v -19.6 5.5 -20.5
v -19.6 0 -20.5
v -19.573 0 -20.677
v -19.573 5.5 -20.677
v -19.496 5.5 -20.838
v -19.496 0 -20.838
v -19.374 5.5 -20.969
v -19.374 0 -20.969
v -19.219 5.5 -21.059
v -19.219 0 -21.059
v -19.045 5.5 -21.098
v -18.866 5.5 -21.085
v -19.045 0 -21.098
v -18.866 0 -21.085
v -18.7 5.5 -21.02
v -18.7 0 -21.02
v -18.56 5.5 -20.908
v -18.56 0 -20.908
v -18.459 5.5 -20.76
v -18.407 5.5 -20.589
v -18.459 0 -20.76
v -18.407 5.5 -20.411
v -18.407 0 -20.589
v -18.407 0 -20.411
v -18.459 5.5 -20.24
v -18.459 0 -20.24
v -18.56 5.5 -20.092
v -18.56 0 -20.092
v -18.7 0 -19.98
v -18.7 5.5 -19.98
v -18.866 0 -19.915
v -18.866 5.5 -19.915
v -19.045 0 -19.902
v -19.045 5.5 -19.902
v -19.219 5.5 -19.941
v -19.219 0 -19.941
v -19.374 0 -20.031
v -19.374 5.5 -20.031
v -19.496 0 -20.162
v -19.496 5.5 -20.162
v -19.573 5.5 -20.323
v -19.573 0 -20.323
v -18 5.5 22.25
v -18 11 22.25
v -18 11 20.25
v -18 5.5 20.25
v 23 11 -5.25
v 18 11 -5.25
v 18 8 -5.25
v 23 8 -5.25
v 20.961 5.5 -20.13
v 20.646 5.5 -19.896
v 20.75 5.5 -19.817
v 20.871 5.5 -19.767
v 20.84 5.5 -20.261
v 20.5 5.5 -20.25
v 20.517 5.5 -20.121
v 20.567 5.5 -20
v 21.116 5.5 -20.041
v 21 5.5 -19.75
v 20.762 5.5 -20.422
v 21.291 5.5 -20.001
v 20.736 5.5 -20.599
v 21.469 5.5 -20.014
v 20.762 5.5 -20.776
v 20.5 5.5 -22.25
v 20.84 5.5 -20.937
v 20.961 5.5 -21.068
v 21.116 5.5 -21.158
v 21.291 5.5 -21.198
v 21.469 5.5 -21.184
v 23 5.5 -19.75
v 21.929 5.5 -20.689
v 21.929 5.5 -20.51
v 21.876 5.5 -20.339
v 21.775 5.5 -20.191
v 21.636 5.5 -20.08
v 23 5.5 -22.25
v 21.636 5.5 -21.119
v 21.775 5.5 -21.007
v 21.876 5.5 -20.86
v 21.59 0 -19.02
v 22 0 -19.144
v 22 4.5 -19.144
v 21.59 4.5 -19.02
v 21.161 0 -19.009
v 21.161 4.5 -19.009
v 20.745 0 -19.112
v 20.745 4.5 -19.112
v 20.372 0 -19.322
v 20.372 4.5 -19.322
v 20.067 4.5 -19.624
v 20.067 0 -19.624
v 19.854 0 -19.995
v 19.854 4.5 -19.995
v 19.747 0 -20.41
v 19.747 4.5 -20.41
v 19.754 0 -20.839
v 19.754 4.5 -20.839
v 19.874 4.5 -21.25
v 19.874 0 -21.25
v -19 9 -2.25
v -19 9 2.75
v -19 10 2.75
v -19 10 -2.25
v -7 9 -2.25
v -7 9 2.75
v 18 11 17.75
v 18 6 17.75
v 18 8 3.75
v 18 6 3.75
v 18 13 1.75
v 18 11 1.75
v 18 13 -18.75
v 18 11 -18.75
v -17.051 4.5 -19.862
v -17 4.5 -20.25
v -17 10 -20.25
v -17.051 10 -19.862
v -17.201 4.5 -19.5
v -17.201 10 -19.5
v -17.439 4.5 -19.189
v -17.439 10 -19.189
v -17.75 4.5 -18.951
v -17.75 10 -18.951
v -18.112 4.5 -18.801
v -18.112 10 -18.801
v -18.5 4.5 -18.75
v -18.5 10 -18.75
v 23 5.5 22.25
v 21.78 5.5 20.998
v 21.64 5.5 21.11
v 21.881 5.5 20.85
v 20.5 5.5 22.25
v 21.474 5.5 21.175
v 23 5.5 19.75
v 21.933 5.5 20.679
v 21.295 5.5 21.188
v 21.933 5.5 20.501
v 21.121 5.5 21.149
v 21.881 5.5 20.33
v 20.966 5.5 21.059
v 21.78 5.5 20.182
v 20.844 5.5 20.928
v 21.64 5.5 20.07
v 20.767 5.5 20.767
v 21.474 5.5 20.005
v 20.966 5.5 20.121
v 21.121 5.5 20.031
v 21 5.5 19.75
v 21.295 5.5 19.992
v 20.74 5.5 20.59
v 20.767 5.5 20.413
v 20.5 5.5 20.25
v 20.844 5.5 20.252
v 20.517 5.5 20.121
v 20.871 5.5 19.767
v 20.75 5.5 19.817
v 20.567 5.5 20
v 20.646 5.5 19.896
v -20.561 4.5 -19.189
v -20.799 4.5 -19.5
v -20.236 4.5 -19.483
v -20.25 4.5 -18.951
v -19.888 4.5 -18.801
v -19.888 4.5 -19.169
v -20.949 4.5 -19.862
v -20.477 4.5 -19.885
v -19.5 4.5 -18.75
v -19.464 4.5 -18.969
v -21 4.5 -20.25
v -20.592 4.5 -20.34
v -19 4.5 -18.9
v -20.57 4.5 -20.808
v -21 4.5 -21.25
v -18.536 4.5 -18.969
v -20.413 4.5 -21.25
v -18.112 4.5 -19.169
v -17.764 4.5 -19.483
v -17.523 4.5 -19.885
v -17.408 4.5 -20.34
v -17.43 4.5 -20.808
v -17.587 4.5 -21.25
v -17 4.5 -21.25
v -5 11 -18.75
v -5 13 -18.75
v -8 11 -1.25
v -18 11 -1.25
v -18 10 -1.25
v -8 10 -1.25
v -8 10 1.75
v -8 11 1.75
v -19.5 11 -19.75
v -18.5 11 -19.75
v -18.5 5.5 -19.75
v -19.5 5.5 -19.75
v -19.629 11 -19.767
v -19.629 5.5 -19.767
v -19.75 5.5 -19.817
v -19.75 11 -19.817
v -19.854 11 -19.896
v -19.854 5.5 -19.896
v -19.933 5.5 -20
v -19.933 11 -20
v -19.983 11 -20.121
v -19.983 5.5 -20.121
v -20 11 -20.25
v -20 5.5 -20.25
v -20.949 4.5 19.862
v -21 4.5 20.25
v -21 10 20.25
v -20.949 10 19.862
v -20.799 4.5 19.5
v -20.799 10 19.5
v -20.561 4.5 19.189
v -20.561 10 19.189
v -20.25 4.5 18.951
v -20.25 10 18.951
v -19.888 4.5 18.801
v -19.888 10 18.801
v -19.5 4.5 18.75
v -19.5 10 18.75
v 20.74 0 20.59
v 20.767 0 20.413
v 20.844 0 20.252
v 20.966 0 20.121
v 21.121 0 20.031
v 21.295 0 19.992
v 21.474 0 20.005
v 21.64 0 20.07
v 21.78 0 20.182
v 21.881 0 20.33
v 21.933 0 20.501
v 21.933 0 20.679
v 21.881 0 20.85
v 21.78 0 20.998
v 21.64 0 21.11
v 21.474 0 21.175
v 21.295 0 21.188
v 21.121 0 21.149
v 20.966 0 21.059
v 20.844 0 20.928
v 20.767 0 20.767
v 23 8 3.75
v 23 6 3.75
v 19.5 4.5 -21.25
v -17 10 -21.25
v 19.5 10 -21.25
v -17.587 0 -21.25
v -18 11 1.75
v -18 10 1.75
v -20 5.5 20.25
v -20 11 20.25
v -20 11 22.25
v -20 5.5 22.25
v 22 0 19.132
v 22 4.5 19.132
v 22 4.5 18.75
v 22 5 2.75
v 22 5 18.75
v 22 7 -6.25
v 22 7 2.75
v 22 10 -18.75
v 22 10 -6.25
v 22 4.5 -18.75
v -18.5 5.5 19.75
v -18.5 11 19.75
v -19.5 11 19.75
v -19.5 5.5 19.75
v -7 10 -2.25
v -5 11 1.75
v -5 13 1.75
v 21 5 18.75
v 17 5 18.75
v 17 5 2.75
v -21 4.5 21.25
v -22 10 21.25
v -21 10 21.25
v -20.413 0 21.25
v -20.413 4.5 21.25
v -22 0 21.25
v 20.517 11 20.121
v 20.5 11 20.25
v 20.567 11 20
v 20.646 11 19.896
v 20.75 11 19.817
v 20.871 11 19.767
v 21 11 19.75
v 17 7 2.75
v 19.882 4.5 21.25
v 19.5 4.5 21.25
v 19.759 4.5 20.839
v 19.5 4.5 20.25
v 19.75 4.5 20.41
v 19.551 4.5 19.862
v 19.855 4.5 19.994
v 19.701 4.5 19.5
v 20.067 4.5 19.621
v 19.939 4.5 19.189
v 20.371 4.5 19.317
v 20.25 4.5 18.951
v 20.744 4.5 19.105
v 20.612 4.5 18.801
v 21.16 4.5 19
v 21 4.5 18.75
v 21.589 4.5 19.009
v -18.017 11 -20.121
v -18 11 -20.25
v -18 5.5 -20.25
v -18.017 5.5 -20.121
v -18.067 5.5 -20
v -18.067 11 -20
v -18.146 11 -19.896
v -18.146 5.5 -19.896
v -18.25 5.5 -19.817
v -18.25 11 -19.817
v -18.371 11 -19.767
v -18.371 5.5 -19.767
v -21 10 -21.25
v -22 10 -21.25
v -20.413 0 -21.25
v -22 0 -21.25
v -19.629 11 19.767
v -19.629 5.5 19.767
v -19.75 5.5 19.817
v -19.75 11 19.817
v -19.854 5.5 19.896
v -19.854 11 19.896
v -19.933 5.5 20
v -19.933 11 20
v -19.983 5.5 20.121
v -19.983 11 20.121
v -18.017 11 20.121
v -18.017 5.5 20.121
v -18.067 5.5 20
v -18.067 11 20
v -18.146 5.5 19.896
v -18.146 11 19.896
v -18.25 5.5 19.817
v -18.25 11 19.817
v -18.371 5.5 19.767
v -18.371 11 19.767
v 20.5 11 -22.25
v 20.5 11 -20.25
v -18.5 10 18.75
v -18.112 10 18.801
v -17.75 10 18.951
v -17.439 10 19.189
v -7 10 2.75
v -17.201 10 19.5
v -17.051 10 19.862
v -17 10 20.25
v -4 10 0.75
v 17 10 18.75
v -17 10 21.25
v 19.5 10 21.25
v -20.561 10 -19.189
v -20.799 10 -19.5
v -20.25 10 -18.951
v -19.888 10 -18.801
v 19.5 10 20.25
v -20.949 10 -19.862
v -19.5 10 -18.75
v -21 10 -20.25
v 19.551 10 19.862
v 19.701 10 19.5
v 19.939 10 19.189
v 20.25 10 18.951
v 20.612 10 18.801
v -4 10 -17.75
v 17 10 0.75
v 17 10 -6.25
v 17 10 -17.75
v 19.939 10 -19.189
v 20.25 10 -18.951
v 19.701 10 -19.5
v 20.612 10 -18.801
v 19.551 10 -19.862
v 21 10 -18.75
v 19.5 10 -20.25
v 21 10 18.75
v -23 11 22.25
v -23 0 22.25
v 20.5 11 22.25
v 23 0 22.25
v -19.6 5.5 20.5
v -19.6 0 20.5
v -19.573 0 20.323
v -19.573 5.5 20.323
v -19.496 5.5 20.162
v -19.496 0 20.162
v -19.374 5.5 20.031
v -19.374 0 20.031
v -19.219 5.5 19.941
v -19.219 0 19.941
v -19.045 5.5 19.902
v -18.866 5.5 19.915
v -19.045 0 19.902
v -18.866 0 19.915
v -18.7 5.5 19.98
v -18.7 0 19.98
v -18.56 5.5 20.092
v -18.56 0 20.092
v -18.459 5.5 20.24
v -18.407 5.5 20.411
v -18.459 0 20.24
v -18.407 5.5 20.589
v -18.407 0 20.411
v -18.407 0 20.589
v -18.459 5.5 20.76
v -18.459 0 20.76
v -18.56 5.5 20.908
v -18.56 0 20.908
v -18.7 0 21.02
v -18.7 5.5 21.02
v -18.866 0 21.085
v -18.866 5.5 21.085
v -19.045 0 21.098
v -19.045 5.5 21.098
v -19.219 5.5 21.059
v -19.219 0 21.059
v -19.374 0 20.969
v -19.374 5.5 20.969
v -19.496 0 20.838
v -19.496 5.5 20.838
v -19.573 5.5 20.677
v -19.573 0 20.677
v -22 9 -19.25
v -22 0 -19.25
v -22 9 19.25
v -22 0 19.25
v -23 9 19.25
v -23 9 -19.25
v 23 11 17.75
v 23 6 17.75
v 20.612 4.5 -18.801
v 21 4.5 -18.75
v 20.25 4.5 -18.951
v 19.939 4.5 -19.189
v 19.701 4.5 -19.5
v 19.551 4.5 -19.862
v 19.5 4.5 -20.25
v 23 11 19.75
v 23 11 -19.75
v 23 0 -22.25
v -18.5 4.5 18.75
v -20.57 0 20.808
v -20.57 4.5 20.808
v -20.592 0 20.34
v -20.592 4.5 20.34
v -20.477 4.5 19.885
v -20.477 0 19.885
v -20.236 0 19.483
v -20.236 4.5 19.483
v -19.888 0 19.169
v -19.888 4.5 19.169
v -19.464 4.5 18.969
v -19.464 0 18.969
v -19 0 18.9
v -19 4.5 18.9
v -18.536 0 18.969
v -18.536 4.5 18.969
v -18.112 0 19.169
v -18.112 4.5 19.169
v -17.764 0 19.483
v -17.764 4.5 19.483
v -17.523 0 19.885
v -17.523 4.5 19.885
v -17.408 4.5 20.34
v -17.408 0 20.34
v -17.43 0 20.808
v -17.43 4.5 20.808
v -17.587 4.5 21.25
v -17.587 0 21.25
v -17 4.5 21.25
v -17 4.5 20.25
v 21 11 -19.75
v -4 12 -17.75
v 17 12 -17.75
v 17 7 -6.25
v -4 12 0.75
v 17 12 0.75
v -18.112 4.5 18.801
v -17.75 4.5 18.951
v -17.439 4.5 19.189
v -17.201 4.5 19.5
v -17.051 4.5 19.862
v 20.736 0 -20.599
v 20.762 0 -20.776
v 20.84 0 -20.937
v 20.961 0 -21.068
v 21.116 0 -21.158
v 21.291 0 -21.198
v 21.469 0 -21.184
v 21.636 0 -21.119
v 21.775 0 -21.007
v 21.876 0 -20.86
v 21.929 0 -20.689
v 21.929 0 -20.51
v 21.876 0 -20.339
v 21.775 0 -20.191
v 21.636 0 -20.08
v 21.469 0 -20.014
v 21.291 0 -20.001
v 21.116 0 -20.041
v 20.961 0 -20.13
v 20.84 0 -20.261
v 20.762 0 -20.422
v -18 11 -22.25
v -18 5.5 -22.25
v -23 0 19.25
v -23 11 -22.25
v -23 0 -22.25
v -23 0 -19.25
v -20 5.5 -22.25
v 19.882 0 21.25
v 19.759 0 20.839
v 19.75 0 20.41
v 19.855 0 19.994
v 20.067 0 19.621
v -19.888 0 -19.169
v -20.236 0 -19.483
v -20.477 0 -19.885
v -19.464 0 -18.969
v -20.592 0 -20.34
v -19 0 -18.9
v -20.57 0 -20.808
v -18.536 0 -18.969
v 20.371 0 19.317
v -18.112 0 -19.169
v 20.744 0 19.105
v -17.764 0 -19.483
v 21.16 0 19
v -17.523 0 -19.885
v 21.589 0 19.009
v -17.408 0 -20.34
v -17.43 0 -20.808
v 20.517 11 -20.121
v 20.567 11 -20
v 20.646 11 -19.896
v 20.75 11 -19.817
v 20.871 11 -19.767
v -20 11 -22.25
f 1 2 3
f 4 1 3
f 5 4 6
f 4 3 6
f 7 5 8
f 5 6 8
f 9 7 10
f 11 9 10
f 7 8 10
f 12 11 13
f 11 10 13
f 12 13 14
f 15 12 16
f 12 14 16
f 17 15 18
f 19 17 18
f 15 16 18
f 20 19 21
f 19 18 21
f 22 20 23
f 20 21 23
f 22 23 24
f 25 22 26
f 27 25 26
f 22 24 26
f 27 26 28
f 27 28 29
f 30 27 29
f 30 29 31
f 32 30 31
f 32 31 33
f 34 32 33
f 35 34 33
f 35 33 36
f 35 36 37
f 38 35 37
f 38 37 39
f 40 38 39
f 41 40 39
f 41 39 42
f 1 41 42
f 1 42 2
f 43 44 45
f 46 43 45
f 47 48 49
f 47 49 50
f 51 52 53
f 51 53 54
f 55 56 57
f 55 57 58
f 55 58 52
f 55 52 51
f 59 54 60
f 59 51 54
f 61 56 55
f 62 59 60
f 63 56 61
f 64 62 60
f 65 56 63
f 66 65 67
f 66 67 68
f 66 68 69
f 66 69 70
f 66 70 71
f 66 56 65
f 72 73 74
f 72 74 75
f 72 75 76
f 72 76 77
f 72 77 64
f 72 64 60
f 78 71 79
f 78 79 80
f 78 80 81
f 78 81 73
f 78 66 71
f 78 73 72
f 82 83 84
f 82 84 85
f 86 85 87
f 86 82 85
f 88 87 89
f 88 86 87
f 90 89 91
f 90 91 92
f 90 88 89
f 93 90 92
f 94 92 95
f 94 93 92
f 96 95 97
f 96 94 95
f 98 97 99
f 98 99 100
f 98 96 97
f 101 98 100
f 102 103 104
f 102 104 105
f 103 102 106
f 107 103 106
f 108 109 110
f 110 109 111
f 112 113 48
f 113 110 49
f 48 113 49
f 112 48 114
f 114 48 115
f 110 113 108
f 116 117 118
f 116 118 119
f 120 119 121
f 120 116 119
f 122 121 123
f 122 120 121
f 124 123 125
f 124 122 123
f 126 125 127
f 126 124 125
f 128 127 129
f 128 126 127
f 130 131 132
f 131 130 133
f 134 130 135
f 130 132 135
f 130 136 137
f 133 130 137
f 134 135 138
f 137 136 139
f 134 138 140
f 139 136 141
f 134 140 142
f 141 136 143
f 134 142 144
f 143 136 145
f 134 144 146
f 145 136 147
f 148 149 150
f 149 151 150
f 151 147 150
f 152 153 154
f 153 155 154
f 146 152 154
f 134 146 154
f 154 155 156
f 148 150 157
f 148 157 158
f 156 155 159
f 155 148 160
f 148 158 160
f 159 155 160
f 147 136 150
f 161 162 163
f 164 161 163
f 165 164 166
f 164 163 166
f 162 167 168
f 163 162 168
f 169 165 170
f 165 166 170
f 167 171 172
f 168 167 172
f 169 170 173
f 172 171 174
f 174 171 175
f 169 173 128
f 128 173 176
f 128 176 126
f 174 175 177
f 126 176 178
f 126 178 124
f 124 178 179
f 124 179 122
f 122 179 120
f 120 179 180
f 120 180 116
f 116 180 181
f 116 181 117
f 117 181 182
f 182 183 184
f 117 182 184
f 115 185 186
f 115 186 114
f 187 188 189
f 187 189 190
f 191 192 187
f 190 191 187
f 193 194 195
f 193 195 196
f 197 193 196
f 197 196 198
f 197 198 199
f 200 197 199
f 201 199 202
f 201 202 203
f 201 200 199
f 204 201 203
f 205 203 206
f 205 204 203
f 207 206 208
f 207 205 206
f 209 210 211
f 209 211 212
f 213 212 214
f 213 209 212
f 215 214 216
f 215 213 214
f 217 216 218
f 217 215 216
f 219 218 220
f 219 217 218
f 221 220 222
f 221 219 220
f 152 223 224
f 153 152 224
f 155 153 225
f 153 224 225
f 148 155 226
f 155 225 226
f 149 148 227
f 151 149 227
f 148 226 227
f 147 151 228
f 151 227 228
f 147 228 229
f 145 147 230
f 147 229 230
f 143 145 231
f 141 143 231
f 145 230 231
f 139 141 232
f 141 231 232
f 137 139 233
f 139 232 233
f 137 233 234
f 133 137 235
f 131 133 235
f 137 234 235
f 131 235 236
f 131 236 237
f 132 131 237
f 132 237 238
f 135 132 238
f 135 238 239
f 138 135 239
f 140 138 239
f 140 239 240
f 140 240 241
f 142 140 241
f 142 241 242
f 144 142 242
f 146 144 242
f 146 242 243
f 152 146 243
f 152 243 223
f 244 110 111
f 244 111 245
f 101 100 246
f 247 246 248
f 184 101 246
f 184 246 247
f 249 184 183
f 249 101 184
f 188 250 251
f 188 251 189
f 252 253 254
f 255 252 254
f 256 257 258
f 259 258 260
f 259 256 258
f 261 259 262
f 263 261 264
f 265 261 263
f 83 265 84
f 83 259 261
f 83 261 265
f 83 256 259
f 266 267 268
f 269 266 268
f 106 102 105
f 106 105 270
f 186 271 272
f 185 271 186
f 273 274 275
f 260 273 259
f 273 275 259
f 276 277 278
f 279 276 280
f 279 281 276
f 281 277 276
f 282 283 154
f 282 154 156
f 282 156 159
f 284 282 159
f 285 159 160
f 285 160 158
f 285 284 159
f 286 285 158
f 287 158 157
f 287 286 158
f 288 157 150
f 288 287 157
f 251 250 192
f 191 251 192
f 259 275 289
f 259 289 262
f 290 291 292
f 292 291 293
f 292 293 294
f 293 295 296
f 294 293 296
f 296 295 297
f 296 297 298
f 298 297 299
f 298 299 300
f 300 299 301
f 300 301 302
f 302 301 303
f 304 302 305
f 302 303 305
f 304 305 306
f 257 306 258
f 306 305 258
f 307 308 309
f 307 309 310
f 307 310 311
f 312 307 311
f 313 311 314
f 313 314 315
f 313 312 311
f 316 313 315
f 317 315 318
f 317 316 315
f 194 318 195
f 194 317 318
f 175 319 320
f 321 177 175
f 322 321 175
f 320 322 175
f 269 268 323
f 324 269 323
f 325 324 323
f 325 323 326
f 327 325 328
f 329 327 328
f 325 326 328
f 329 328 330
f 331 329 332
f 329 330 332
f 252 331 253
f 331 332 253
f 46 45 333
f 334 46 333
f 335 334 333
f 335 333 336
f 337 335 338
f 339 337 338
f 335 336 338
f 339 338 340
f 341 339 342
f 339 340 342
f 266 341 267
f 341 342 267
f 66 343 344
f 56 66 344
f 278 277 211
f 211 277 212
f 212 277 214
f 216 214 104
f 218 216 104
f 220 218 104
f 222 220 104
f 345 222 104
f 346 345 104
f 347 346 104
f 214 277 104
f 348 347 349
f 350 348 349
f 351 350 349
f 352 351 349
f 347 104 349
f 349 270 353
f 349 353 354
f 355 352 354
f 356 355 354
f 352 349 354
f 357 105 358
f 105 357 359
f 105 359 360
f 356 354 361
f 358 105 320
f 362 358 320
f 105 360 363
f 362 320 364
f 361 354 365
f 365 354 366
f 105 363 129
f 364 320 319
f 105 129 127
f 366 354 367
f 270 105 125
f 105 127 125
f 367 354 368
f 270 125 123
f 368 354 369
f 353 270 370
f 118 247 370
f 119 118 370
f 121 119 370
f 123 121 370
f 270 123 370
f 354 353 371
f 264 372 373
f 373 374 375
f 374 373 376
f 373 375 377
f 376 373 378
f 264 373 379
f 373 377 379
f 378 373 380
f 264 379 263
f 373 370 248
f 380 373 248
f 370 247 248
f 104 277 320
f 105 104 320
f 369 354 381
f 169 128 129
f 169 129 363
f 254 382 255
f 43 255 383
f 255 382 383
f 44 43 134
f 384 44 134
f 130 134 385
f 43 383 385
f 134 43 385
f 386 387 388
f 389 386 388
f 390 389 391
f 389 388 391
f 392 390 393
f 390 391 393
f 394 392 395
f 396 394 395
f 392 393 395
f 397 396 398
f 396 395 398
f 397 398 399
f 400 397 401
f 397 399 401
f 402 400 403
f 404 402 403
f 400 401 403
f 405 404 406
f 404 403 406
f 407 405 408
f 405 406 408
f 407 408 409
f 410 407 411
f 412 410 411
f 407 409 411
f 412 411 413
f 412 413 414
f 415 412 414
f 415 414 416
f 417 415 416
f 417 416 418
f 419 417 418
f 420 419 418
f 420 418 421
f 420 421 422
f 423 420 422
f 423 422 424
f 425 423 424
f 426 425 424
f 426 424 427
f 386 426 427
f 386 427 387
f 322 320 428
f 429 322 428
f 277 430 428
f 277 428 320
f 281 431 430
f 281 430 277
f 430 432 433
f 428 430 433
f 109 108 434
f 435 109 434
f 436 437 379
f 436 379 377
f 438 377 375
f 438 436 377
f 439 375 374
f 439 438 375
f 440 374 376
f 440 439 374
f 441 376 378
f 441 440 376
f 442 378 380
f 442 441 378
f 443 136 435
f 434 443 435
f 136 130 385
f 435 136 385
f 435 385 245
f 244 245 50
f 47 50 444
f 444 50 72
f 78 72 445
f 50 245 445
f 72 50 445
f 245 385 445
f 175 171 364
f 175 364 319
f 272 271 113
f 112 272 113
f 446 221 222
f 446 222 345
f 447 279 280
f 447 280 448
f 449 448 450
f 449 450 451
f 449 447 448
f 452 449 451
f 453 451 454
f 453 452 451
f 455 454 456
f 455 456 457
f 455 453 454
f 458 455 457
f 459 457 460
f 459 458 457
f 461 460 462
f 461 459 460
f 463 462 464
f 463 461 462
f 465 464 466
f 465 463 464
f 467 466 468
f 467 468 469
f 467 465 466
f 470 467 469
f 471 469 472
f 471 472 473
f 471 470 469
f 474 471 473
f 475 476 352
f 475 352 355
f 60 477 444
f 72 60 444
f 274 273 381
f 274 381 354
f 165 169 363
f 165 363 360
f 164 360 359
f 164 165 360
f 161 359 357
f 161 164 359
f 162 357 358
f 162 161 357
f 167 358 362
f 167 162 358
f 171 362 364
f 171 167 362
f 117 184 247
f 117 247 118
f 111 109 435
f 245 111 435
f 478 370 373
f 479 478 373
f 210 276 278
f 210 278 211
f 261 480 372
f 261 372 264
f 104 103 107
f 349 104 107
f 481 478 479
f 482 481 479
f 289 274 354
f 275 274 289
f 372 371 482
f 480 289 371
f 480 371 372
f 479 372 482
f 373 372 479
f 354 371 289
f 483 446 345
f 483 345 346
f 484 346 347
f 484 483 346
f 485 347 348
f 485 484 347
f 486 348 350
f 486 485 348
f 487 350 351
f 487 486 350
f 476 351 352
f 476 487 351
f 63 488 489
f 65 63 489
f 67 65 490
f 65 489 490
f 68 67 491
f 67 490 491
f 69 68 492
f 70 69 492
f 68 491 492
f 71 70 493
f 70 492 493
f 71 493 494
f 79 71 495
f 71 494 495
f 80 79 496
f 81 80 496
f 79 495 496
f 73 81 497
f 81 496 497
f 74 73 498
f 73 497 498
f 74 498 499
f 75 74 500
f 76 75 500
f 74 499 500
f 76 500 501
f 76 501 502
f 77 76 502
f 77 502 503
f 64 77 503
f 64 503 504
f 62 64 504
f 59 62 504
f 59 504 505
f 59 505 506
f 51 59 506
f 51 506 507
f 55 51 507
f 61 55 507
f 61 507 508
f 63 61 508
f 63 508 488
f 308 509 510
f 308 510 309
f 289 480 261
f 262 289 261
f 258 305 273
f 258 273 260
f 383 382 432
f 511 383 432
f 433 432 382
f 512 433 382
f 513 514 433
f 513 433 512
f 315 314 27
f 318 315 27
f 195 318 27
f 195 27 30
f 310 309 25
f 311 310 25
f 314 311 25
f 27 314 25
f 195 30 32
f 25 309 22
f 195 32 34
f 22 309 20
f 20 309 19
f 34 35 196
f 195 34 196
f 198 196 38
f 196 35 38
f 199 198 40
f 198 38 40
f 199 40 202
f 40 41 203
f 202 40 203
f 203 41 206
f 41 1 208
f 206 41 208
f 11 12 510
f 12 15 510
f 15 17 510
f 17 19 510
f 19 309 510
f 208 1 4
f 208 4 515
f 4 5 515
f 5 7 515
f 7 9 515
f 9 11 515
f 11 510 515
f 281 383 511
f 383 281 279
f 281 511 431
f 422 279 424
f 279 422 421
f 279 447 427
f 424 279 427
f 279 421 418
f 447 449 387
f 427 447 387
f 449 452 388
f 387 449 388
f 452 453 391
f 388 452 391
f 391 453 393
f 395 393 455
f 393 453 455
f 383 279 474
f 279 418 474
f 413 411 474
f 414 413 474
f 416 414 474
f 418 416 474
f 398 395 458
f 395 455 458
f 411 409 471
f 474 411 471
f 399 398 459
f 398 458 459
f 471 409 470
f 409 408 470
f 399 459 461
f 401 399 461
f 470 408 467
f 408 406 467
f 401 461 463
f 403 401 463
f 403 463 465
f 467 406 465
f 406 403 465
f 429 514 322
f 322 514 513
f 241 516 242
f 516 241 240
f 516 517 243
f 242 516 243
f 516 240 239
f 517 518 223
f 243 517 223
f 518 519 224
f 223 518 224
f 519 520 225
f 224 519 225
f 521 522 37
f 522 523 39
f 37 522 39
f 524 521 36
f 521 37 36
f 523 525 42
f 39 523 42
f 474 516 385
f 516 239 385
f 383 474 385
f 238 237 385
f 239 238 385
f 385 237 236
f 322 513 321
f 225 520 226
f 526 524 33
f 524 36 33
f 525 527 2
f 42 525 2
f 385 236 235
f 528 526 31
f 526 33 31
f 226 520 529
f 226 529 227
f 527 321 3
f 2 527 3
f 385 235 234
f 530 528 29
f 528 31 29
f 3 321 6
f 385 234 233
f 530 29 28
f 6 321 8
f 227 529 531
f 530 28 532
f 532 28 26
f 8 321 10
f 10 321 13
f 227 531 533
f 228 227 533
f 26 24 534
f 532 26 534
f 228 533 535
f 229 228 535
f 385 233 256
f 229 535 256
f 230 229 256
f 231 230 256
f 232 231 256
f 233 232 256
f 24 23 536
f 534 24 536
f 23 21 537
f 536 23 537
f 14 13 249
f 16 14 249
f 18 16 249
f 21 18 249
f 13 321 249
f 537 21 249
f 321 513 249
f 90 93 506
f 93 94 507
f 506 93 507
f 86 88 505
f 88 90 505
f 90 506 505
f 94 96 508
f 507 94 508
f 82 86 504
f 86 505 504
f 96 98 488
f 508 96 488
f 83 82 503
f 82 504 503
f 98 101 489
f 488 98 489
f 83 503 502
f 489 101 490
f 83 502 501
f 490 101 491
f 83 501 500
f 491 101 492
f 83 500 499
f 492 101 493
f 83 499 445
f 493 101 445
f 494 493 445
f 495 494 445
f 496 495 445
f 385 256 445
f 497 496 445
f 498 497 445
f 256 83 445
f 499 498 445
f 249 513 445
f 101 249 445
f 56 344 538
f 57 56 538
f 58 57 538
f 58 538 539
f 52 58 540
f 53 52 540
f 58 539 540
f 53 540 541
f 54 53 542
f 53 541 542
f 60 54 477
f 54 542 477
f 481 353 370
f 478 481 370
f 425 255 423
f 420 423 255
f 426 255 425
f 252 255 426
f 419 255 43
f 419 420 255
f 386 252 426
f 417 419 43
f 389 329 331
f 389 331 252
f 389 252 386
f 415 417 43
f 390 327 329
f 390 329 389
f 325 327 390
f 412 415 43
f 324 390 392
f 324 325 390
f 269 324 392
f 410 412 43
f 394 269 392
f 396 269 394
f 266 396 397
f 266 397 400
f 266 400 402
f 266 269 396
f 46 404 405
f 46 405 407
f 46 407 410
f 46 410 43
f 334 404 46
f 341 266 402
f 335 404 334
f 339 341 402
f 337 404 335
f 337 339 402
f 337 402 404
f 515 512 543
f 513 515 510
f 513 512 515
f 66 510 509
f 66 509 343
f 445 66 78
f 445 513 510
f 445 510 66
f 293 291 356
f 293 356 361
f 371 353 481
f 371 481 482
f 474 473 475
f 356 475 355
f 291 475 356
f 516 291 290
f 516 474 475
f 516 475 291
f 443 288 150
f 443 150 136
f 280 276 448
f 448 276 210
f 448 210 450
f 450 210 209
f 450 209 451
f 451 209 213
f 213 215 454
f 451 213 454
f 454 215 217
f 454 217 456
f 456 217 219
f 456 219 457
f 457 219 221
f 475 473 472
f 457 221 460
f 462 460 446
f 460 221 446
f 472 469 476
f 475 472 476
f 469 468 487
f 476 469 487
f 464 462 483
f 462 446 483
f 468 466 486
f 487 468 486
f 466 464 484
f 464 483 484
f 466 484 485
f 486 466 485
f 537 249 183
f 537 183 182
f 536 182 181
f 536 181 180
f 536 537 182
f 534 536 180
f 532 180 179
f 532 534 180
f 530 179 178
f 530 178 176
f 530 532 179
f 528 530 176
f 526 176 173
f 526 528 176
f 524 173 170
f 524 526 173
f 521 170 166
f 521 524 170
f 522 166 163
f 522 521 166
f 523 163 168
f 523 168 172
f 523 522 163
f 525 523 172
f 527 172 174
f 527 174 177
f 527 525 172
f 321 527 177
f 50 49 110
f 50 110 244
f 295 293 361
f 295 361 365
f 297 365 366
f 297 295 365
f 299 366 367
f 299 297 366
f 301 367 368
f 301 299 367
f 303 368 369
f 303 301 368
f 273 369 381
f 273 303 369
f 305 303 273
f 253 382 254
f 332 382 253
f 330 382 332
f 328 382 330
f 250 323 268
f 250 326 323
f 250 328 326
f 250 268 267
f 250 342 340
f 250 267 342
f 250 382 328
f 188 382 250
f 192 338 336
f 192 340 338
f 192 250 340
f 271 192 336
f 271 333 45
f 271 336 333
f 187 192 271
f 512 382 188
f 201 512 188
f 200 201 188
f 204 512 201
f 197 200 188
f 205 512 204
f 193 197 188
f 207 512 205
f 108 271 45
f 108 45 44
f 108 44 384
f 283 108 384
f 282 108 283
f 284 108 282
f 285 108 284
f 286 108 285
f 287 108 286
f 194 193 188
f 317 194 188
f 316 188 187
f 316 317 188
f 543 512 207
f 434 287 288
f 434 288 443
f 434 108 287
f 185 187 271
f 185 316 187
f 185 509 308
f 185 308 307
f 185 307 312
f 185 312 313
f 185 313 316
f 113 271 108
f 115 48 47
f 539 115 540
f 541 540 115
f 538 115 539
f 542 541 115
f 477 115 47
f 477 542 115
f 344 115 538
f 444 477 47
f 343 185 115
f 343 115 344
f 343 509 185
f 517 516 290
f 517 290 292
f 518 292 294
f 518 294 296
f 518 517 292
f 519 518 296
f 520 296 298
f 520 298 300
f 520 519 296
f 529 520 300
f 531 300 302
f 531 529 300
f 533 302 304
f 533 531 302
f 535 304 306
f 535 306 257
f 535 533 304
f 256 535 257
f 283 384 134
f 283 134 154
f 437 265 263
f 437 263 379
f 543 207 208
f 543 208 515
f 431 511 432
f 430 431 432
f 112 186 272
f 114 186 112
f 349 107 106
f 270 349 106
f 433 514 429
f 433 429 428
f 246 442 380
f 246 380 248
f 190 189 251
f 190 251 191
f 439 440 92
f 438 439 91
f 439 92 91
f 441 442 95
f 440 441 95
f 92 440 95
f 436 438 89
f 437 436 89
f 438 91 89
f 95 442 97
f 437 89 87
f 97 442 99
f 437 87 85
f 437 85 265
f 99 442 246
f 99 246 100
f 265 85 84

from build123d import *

# Parameters (mm, degrees)
SCHIZZO1_W                   = 46
SCHIZZO1_H                   = 44.5
ESTRUSIONE_ESTRUSIONE1_DEPTH = 11
SCHIZZO2_W                   = 23
SCHIZZO2_H                   = 20.5
ESTRUSIONE_ESTRUSIONE2_DEPTH = 2
TAGLIO_ESTRUSIONE1_DEPTH     = 5.5
SCHIZZO5_W                   = 38.5
SCHIZZO5_H                   = 9
TAGLIO_ESTRUSIONE2_DEPTH     = 1
SCHIZZO9_W                   = 10
SCHIZZO9_H                   = 3
TAGLIO_ESTRUSIONE4_DEPTH     = 1
SCHIZZO10_W                  = 5
SCHIZZO10_H                  = 23
TAGLIO_ESTRUSIONE5_DEPTH     = 3
SCHIZZO11_W                  = 5
SCHIZZO11_H                  = 14
TAGLIO_ESTRUSIONE6_DEPTH     = 2
FORO_PER_VITE_M1_2_D         = 1.2
SVUOTA3_OUTLINE_W            = 12
SVUOTA3_OUTLINE_H            = 5
SVUOTA3_DEPTH                = 10
SVUOTA3_2_OUTLINE_W          = 5
SVUOTA3_2_OUTLINE_H          = 25
SVUOTA3_2_OUTLINE_W_2        = 12
SVUOTA3_2_OUTLINE_H_2        = 5
SVUOTA3_2_DEPTH              = 5
SVUOTA3_START                = 10
SVUOTA3_3_OUTLINE_W          = 21
SVUOTA3_3_OUTLINE_H          = 18.5
SVUOTA3_3_DEPTH              = 2
SVUOTA3_START_2              = 5
SVUOTA3_4_OUTLINE_W          = 12
SVUOTA3_4_OUTLINE_H          = 5
SVUOTA3_4_DEPTH              = 4
SVUOTA3_5_OUTLINE_W          = 5
SVUOTA3_5_OUTLINE_H          = 9
SVUOTA3_5_DEPTH              = 2
SVUOTA3_6_DEPTH              = 4.5


# Read off the part's stored shape, not the designer's step: Svuota3
with BuildPart() as part:
    # Schizzo1 → Estrusione-Estrusione1 (new body)
    with BuildSketch(Plane(origin=(0, 0, 0), x_dir=(1, 0, 0), z_dir=(0, 1, 0))):
        Rectangle(SCHIZZO1_W, SCHIZZO1_H)
    extrude(amount=ESTRUSIONE_ESTRUSIONE1_DEPTH)

    # Schizzo2 → Estrusione-Estrusione2 (add)
    with BuildSketch(Plane(origin=(0, 11, 0), x_dir=(1, 0, 0), z_dir=(0, 1, 0))):
        with Locations((6.5, 8.5)):
            Rectangle(SCHIZZO2_W, SCHIZZO2_H)
    extrude(amount=ESTRUSIONE_ESTRUSIONE2_DEPTH)

    # Schizzo3 → Taglio-Estrusione1 (cut)
    with BuildSketch(Plane(origin=(0, 11, 0), x_dir=(1, 0, 0), z_dir=(0, 1, 0))):
        with BuildLine():
            Line((23, 22.25), (20.5, 22.25))
            Line((20.5, 22.25), (20.5, 20.25))
            ThreePointArc((20.5, 20.25), (20.646446609, 19.896446609), (21, 19.75))
            Line((21, 19.75), (23, 19.75))
            Line((23, 19.75), (23, 22.25))
        make_face()
        with BuildLine():
            Line((23, -22.25), (20.5, -22.25))
            Line((20.5, -22.25), (20.5, -20.25))
            ThreePointArc((20.5, -20.25), (20.646446609, -19.896446609), (21, -19.75))
            Line((21, -19.75), (23, -19.75))
            Line((23, -19.75), (23, -22.25))
        make_face()
        with BuildLine():
            Line((-20, 22.25), (-18, 22.25))
            Line((-18, 22.25), (-18, 20.25))
            ThreePointArc((-18, 20.25), (-18.146446609, 19.896446609), (-18.5, 19.75))
            Line((-18.5, 19.75), (-19.5, 19.75))
            ThreePointArc((-19.5, 19.75), (-19.853553391, 19.896446609), (-20, 20.25))
            Line((-20, 20.25), (-20, 22.25))
        make_face()
        with BuildLine():
            Line((-20, -22.25), (-18, -22.25))
            Line((-18, -22.25), (-18, -20.25))
            ThreePointArc((-18, -20.25), (-18.146446609, -19.896446609), (-18.5, -19.75))
            Line((-18.5, -19.75), (-19.5, -19.75))
            ThreePointArc((-19.5, -19.75), (-19.853553391, -19.896446609), (-20, -20.25))
            Line((-20, -20.25), (-20, -22.25))
        make_face()
    extrude(amount=-TAGLIO_ESTRUSIONE1_DEPTH, mode=Mode.SUBTRACT)

    # Schizzo5 → Taglio-Estrusione2 (cut)
    with BuildSketch(Plane(origin=(-23, 0, -0.75), x_dir=(0, 0, -1), z_dir=(1, 0, 0))):
        with Locations((-0.75, 4.5)):
            Rectangle(SCHIZZO5_W, SCHIZZO5_H)
    extrude(amount=TAGLIO_ESTRUSIONE2_DEPTH, mode=Mode.SUBTRACT)

    # Schizzo9 → Taglio-Estrusione4 (cut)
    with BuildSketch(Plane(origin=(0, 11, 0), x_dir=(1, 0, 0), z_dir=(0, 1, 0))):
        with Locations((-13, -0.25)):
            Rectangle(SCHIZZO9_W, SCHIZZO9_H)
    extrude(amount=-TAGLIO_ESTRUSIONE4_DEPTH, mode=Mode.SUBTRACT)

    # Schizzo10 → Taglio-Estrusione5 (cut)
    with BuildSketch(Plane(origin=(0, 11, 0), x_dir=(1, 0, 0), z_dir=(0, 1, 0))):
        with Locations((20.5, -6.25)):
            Rectangle(SCHIZZO10_W, SCHIZZO10_H)
    extrude(amount=-TAGLIO_ESTRUSIONE5_DEPTH, mode=Mode.SUBTRACT)

    # Schizzo11 → Taglio-Estrusione6 (cut)
    with BuildSketch(Plane(origin=(0, 8, 0), x_dir=(1, 0, 0), z_dir=(0, 1, 0))):
        with Locations((20.5, -10.75)):
            Rectangle(SCHIZZO11_W, SCHIZZO11_H)
    extrude(amount=-TAGLIO_ESTRUSIONE6_DEPTH, mode=Mode.SUBTRACT)

    # Foro per Vite M1-2 (through all)
    with Locations(Plane(origin=(0, 5.5, 0), x_dir=(1, 0, 0), z_dir=(0, 1, 0))):
        with Locations((21.34, -20.59), (21.335553897, 20.599331768), (-19, 20.5), (-19, -20.5)):
            Hole(FORO_PER_VITE_M1_2_D / 2)

    # Svuota3 outline → Svuota3 (cut)
    with BuildSketch(Plane(origin=(0, 0, 0), x_dir=(1, 0, 0), z_dir=(0, 1, 0))):
        with BuildLine():
            Line((22, 6.25), (22, 18.75))
            Line((22, 18.75), (21, 18.75))
            ThreePointArc((21, 18.75), (19.939339828, 19.189339828), (19.5, 20.25))
            Line((19.5, 20.25), (19.5, 21.25))
            Line((19.5, 21.25), (-17, 21.25))
            Line((-17, 21.25), (-17, 20.25))
            ThreePointArc((-17, 20.25), (-17.439339828, 19.189339828), (-18.5, 18.75))
            Line((-18.5, 18.75), (-19.5, 18.75))
            ThreePointArc((-19.5, 18.75), (-20.560660172, 19.189339828), (-21, 20.25))
            Line((-21, 20.25), (-21, 21.25))
            Line((-21, 21.25), (-22, 21.25))
            Line((-22, 21.25), (-22, -21.25))
            Line((-22, -21.25), (-21, -21.25))
            Line((-21, -21.25), (-21, -20.25))
            ThreePointArc((-21, -20.25), (-20.560660172, -19.189339828), (-19.5, -18.75))
            Line((-19.5, -18.75), (-18.5, -18.75))
            ThreePointArc((-18.5, -18.75), (-17.439339828, -19.189339828), (-17, -20.25))
            Line((-17, -20.25), (-17, -21.25))
            Line((-17, -21.25), (19.5, -21.25))
            Line((19.5, -21.25), (19.5, -20.25))
            ThreePointArc((19.5, -20.25), (19.939339828, -19.189339828), (21, -18.75))
            Line((21, -18.75), (17, -18.75))
            Line((17, -18.75), (17, 6.25))
            Line((17, 6.25), (22, 6.25))
        make_face()
        with Locations((-13, -0.25)):
            Rectangle(SVUOTA3_OUTLINE_W, SVUOTA3_OUTLINE_H, mode=Mode.SUBTRACT)
    extrude(amount=SVUOTA3_DEPTH, mode=Mode.SUBTRACT)

    # Svuota3 2 outline → Svuota3 2 (cut)
    with BuildSketch(Plane(origin=(0, 0, 0), x_dir=(1, 0, 0), z_dir=(0, 1, 0))):
        with Locations((19.5, -6.25)):
            Rectangle(SVUOTA3_2_OUTLINE_W, SVUOTA3_2_OUTLINE_H)
        with Locations((-13, -0.25)):
            Rectangle(SVUOTA3_2_OUTLINE_W_2, SVUOTA3_2_OUTLINE_H_2)
    extrude(amount=SVUOTA3_2_DEPTH, mode=Mode.SUBTRACT)

    # Svuota3 3 outline → Svuota3 3 (cut)
    with BuildSketch(Plane(origin=(0, 0, 0), x_dir=(1, 0, 0), z_dir=(0, 1, 0)).offset(SVUOTA3_START)):
        with Locations((6.5, 8.5)):
            Rectangle(SVUOTA3_3_OUTLINE_W, SVUOTA3_3_OUTLINE_H)
    extrude(amount=SVUOTA3_3_DEPTH, mode=Mode.SUBTRACT)

    # Svuota3 4 outline → Svuota3 4 (cut)
    with BuildSketch(Plane(origin=(0, 0, 0), x_dir=(1, 0, 0), z_dir=(0, 1, 0)).offset(SVUOTA3_START_2)):
        with Locations((-13, -0.25)):
            Rectangle(SVUOTA3_4_OUTLINE_W, SVUOTA3_4_OUTLINE_H)
    extrude(amount=SVUOTA3_4_DEPTH, mode=Mode.SUBTRACT)

    # Svuota3 5 outline → Svuota3 5 (cut)
    with BuildSketch(Plane(origin=(0, 0, 0), x_dir=(1, 0, 0), z_dir=(0, 1, 0)).offset(SVUOTA3_START_2)):
        with Locations((19.5, 1.75)):
            Rectangle(SVUOTA3_5_OUTLINE_W, SVUOTA3_5_OUTLINE_H)
    extrude(amount=SVUOTA3_5_DEPTH, mode=Mode.SUBTRACT)

    # Svuota3 6 outline → Svuota3 6 (cut)
    with BuildSketch(Plane(origin=(0, 0, 0), x_dir=(1, 0, 0), z_dir=(0, 1, 0))):
        with BuildLine():
            Line((22, 18.75), (22, 19.143821075))
            ThreePointArc((22, 19.143821075), (20.209538985, 19.462630216), (19.873832018, 21.25))
            Line((19.873832018, 21.25), (19.5, 21.25))
            Line((19.5, 21.25), (19.5, 20.25))
            ThreePointArc((19.5, 20.25), (19.939339828, 19.189339828), (21, 18.75))
            Line((21, 18.75), (22, 18.75))
        make_face()
        with BuildLine():
            Line((-17, 20.25), (-17, 21.25))
            Line((-17, 21.25), (-17.586670597, 21.25))
            ThreePointArc((-17.586670597, 21.25), (-19, 18.9), (-20.413329403, 21.25))
            Line((-20.413329403, 21.25), (-21, 21.25))
            Line((-21, 21.25), (-21, 20.25))
            ThreePointArc((-21, 20.25), (-20.560660172, 19.189339828), (-19.5, 18.75))
            Line((-19.5, 18.75), (-18.5, 18.75))
            ThreePointArc((-18.5, 18.75), (-17.439339828, 19.189339828), (-17, 20.25))
        make_face()
        with BuildLine():
            Line((22, -19.132467839), (22, -18.75))
            Line((22, -18.75), (21, -18.75))
            ThreePointArc((21, -18.75), (19.939339828, -19.189339828), (19.5, -20.25))
            Line((19.5, -20.25), (19.5, -21.25))
            Line((19.5, -21.25), (19.882467839, -21.25))
            ThreePointArc((19.882467839, -21.25), (20.20862915, -19.45862915), (22, -19.132467839))
        make_face()
        with BuildLine():
            Line((-17.586670597, -21.25), (-17, -21.25))
            Line((-17, -21.25), (-17, -20.25))
            ThreePointArc((-17, -20.25), (-17.439339828, -19.189339828), (-18.5, -18.75))
            Line((-18.5, -18.75), (-19.5, -18.75))
            ThreePointArc((-19.5, -18.75), (-20.560660172, -19.189339828), (-21, -20.25))
            Line((-21, -20.25), (-21, -21.25))
            Line((-21, -21.25), (-20.413329403, -21.25))
            ThreePointArc((-20.413329403, -21.25), (-19, -18.9), (-17.586670597, -21.25))
        make_face()
    extrude(amount=SVUOTA3_6_DEPTH, mode=Mode.SUBTRACT)


solid = part.part
